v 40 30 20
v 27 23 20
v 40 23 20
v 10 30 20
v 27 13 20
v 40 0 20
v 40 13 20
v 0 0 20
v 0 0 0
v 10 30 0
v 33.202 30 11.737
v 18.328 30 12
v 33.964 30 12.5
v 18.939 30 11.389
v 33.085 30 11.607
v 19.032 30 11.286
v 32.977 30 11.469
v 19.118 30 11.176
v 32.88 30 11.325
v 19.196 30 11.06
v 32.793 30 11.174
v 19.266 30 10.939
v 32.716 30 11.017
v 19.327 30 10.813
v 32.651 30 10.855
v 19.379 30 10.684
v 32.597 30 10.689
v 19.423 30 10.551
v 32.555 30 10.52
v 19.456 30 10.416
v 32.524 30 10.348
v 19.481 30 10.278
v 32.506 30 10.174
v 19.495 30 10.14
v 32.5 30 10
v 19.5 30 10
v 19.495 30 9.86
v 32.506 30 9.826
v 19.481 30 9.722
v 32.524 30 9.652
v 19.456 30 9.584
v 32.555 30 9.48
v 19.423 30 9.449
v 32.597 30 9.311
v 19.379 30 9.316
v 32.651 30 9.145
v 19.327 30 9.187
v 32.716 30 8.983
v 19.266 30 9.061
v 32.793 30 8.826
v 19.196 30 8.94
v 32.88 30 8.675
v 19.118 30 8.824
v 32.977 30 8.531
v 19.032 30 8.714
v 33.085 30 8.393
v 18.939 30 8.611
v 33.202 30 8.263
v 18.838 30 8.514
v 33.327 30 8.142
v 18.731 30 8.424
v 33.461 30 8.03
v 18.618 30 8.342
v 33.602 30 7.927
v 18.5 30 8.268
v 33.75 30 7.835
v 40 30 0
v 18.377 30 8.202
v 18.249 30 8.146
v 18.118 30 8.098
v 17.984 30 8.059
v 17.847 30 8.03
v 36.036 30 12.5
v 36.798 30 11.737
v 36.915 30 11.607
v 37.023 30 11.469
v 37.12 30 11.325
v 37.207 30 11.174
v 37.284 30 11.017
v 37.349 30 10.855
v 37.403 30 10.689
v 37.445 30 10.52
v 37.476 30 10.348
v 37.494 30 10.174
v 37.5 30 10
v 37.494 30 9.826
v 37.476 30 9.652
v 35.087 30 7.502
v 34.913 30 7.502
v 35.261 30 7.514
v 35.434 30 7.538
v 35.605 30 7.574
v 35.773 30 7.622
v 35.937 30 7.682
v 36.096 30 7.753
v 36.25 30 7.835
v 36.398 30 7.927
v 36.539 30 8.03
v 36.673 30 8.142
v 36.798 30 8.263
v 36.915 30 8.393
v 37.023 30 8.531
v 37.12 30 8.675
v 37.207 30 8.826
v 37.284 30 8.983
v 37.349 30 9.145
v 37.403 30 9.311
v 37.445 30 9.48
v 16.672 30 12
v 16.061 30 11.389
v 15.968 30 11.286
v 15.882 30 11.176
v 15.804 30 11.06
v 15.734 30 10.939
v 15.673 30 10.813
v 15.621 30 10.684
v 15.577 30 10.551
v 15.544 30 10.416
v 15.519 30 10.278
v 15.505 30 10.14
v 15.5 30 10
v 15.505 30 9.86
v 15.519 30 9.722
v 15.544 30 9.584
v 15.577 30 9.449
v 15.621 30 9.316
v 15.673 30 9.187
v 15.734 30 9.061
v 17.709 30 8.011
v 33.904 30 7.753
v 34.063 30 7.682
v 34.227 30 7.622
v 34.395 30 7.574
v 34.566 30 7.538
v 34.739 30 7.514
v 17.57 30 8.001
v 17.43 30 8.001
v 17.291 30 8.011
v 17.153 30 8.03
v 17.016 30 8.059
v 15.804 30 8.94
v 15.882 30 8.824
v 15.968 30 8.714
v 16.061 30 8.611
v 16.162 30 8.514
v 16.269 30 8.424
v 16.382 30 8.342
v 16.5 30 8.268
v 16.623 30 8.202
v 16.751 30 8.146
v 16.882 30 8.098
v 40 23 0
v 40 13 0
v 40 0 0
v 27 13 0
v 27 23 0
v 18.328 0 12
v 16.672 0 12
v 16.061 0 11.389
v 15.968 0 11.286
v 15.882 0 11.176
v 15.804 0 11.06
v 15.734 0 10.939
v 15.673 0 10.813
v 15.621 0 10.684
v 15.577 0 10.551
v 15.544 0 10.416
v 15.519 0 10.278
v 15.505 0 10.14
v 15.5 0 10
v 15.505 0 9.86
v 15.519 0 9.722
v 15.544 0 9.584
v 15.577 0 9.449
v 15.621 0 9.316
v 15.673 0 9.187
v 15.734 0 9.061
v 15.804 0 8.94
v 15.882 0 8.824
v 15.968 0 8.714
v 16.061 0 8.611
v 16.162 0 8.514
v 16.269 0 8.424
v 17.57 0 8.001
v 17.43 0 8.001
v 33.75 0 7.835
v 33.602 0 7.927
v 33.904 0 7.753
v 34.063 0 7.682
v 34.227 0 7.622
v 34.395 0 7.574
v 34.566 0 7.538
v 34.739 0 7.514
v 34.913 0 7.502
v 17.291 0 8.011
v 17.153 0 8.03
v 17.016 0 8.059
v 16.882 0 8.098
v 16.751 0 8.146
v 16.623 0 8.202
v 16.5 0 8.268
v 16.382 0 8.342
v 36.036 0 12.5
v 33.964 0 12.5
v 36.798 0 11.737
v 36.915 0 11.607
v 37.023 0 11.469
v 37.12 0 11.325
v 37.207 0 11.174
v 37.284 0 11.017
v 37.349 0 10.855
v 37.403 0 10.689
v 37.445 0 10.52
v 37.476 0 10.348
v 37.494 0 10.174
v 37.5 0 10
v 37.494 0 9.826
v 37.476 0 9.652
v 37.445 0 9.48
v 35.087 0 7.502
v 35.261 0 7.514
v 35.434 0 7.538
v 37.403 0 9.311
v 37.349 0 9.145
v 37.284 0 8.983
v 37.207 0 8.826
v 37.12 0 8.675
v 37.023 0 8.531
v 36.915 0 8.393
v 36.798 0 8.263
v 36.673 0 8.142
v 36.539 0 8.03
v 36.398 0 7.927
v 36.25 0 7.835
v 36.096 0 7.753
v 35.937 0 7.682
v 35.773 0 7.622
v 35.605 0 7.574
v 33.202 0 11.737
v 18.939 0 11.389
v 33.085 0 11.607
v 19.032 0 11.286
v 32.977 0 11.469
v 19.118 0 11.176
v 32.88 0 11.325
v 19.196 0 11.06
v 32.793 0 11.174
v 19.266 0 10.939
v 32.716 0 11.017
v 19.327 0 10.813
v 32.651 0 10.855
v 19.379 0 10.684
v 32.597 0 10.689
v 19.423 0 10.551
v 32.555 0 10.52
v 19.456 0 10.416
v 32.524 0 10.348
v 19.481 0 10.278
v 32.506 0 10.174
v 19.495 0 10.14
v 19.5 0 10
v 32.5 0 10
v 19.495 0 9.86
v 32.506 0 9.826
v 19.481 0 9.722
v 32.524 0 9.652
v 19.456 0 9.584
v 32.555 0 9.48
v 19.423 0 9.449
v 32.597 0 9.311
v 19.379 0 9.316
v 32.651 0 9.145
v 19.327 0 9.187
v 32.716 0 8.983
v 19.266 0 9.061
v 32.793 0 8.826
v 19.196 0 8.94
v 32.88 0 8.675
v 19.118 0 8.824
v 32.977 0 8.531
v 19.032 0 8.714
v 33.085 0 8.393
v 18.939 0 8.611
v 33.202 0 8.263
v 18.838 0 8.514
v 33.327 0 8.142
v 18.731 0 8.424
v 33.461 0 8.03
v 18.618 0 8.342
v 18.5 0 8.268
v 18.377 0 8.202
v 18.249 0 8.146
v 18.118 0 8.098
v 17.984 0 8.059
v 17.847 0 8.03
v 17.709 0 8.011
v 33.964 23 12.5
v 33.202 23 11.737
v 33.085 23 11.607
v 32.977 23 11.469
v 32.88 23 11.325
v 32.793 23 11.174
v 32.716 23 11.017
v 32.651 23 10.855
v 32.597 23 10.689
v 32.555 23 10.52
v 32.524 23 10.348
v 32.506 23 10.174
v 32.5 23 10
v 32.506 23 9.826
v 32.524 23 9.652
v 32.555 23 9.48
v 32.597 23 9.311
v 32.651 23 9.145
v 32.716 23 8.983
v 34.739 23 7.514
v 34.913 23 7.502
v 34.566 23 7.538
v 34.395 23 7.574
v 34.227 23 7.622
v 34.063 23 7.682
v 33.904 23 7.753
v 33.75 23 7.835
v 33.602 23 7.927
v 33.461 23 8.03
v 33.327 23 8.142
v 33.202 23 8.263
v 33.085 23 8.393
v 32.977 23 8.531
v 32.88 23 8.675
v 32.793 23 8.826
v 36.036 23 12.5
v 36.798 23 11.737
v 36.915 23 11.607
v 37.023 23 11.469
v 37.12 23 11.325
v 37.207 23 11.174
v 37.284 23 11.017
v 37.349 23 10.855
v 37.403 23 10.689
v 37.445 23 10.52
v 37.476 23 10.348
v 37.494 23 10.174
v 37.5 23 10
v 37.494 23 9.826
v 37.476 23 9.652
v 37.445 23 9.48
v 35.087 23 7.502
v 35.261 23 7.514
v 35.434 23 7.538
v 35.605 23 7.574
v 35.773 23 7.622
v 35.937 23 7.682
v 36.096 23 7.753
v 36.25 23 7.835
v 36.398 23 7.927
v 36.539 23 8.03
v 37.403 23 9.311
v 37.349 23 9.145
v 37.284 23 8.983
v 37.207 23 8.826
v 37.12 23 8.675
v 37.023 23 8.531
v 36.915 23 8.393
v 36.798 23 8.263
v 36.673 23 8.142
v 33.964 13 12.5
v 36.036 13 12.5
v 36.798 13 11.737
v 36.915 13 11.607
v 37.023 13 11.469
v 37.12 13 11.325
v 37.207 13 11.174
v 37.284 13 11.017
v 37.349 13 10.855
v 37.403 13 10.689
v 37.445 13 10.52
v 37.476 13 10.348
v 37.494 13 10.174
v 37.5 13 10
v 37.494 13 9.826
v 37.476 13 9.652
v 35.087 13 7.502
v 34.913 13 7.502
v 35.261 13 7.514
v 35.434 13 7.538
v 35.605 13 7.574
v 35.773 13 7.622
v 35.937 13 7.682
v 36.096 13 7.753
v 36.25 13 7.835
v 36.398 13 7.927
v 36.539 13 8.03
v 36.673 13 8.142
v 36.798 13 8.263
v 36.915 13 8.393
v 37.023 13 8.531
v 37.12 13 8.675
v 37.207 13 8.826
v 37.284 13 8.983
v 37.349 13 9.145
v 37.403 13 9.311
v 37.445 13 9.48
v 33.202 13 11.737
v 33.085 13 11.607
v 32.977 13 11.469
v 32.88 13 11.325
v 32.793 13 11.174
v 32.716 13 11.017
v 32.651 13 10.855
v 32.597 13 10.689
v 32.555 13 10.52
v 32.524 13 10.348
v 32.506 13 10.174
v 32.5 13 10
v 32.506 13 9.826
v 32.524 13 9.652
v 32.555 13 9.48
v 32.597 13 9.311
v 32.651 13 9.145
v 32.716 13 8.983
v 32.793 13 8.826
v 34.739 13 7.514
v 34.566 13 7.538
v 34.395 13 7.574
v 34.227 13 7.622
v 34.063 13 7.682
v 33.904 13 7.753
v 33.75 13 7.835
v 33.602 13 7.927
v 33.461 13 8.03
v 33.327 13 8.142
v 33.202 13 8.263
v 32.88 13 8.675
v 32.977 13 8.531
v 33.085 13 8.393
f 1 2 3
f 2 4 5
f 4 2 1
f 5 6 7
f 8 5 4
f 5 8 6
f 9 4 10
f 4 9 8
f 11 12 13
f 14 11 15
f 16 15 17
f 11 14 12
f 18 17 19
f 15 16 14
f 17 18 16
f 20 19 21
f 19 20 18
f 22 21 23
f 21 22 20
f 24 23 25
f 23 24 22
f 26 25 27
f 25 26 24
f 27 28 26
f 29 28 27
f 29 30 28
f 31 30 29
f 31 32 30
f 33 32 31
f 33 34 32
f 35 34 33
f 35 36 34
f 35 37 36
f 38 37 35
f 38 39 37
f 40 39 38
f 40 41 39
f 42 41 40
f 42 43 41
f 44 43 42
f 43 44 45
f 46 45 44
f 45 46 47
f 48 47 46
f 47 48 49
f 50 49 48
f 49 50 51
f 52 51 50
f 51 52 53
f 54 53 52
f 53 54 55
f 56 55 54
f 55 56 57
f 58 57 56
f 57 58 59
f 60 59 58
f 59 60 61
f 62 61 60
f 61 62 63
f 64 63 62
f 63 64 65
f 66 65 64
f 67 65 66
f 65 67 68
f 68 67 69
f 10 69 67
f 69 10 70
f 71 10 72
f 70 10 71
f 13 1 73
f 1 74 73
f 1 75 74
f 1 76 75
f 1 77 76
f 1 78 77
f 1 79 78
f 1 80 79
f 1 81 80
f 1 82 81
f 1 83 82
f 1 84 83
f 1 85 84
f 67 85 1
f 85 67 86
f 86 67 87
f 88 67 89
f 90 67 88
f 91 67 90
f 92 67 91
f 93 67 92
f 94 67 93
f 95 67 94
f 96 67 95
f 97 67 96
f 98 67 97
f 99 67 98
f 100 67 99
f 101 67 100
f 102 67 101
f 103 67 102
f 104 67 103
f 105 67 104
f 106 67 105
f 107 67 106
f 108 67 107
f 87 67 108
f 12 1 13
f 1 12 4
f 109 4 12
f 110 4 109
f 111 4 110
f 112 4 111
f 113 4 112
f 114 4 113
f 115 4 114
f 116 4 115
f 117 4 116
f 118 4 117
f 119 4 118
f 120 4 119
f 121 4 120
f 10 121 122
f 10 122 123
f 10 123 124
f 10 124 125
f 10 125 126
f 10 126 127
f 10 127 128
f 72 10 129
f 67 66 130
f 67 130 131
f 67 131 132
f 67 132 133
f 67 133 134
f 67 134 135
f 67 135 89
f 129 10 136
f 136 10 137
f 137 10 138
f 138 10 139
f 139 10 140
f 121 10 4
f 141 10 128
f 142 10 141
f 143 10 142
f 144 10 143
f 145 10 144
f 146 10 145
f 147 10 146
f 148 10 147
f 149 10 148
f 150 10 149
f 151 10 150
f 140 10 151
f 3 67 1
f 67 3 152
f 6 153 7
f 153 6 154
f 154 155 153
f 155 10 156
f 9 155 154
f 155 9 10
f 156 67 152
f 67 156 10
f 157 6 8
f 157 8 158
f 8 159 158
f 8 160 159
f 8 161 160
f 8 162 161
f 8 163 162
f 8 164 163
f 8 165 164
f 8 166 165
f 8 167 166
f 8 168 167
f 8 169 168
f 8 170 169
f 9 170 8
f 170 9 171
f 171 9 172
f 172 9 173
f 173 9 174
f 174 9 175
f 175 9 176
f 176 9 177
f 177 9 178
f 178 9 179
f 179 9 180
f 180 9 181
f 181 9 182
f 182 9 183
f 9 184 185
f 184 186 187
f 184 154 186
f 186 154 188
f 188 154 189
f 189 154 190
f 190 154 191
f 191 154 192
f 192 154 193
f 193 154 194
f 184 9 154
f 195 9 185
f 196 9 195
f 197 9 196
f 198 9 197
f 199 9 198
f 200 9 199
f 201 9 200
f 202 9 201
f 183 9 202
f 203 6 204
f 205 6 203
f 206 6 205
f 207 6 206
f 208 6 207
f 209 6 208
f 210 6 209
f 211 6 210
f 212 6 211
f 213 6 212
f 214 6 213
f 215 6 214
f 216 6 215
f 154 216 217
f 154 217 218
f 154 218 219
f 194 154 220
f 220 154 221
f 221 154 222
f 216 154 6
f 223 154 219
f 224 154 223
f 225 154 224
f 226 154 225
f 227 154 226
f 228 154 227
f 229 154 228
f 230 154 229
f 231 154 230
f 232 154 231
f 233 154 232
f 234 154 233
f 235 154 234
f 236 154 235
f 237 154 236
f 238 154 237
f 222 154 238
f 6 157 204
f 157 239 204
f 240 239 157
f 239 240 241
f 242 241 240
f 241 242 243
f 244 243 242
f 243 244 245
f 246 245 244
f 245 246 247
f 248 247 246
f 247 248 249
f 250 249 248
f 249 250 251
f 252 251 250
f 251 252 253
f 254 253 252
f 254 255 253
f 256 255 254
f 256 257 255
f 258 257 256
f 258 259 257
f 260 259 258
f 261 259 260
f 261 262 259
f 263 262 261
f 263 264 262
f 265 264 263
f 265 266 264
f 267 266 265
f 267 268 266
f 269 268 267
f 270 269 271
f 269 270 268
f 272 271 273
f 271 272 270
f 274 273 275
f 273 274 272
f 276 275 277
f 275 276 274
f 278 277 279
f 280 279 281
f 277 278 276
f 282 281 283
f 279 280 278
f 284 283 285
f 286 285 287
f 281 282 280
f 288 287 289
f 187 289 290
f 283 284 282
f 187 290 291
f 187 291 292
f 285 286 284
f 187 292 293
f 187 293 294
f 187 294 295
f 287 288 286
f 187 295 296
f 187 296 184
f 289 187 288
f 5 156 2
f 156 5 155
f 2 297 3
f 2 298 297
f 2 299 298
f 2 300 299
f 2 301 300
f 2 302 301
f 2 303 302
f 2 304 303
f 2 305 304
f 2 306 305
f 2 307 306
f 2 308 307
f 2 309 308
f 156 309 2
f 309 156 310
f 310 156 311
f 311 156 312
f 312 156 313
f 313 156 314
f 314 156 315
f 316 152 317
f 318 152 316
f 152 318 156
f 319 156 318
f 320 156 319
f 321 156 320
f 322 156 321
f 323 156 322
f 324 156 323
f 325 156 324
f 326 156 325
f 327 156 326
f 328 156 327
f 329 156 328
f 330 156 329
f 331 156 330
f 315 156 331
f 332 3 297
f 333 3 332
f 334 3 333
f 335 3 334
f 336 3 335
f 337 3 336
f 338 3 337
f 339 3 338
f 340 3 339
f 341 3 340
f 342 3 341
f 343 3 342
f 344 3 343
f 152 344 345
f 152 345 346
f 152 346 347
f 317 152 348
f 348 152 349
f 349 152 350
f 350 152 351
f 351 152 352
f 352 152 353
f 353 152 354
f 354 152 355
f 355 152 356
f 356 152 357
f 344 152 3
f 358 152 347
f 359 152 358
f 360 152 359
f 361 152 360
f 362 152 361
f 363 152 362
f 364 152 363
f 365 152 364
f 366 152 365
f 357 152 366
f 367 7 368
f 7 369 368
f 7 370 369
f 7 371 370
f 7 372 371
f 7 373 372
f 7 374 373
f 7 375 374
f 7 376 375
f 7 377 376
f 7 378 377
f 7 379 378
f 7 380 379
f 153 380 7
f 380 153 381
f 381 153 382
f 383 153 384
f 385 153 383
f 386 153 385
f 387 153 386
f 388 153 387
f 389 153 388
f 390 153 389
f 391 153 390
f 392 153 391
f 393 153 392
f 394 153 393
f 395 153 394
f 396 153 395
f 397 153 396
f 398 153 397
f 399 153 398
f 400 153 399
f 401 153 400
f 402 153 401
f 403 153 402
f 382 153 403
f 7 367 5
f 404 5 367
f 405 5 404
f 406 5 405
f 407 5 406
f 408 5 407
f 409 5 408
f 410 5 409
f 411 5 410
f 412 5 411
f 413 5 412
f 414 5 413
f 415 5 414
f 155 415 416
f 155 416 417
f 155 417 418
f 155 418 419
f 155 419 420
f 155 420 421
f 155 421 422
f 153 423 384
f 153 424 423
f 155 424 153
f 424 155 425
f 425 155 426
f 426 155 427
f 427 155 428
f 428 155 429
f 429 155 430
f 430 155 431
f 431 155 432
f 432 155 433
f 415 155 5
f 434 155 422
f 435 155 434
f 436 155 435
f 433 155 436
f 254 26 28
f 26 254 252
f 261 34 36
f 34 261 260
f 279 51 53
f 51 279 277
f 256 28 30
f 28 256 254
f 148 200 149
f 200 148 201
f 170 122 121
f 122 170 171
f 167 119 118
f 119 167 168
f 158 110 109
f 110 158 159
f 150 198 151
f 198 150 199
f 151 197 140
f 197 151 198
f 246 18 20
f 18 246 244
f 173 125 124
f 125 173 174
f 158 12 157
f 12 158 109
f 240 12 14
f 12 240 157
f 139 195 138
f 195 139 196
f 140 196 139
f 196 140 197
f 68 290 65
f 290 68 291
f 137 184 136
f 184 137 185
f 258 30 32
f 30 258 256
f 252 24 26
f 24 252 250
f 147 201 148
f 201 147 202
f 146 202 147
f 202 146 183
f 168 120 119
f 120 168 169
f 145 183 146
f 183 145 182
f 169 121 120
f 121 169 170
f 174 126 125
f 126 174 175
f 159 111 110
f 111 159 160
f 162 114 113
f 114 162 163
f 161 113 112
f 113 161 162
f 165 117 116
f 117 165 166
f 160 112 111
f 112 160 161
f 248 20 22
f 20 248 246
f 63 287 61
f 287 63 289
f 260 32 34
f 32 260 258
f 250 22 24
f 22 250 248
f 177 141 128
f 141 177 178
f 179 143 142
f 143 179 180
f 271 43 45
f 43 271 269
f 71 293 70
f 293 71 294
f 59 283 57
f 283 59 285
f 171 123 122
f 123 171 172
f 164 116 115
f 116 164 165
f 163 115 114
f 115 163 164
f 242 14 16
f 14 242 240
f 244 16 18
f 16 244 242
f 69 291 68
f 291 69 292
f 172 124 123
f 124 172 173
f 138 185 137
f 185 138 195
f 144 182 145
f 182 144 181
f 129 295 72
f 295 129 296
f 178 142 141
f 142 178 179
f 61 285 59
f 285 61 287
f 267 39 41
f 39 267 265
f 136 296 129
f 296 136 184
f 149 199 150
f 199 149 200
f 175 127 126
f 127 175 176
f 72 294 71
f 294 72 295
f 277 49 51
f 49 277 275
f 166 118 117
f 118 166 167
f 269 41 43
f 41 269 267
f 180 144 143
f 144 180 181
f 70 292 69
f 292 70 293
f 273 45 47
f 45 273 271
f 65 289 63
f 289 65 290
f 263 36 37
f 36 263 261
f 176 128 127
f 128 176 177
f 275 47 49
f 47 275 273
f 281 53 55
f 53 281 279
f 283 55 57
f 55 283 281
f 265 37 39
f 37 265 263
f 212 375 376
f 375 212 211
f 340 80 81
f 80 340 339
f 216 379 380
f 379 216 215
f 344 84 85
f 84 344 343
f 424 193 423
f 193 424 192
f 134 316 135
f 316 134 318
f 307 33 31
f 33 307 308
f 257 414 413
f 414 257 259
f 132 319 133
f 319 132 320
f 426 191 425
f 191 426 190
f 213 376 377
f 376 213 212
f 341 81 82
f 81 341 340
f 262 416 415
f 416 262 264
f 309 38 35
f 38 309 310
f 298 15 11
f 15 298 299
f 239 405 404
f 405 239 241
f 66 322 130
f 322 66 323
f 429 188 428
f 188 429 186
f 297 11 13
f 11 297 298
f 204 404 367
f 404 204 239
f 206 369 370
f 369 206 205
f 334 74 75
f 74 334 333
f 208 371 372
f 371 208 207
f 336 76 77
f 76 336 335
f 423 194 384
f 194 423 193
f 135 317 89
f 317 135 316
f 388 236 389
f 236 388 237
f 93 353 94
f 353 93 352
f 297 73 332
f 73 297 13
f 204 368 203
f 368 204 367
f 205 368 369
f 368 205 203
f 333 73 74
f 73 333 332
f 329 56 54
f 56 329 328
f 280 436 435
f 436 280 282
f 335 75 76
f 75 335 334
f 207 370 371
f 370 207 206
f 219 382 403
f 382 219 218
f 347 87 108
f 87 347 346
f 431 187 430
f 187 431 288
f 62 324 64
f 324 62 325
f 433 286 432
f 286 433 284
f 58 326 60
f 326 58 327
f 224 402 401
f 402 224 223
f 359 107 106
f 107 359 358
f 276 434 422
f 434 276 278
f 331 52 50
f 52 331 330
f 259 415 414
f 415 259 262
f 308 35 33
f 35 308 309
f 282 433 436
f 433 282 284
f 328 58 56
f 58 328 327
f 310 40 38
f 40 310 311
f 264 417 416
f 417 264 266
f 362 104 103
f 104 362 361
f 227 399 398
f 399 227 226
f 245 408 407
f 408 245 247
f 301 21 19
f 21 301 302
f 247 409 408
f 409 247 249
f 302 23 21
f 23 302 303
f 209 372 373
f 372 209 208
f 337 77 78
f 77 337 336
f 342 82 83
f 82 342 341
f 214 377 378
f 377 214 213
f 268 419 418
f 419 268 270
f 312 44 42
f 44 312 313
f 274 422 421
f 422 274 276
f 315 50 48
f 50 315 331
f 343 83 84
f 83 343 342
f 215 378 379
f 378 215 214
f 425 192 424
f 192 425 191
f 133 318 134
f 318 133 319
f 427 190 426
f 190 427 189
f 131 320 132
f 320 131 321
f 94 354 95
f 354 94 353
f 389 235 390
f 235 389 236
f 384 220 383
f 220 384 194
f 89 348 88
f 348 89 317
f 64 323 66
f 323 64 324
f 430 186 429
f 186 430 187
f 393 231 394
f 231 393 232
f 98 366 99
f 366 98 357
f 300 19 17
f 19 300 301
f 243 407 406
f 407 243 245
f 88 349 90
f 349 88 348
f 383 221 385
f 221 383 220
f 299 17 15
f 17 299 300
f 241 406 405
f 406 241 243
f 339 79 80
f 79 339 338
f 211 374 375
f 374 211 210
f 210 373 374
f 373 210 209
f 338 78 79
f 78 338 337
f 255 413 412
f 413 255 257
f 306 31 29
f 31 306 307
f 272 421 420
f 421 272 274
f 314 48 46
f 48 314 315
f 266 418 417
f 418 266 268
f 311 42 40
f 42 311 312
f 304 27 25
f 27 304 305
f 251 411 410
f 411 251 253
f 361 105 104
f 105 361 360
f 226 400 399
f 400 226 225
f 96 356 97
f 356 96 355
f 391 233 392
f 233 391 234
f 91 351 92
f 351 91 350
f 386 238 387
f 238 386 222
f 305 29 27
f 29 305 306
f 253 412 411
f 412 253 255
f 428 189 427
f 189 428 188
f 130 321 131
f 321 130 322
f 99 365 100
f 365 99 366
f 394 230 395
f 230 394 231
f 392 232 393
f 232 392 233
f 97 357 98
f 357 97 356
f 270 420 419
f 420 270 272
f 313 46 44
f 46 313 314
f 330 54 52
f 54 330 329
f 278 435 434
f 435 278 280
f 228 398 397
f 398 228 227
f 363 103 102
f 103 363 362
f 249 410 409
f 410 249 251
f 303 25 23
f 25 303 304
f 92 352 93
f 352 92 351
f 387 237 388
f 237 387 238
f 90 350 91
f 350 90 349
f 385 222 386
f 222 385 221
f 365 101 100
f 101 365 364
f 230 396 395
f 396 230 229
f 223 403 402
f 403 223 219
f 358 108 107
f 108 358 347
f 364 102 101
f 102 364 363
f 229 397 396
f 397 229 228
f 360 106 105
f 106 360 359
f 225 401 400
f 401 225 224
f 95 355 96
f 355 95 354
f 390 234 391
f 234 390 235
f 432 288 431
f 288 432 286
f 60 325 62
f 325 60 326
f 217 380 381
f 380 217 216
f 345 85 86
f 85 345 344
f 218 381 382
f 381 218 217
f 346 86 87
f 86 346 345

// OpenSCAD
// file: trunctear.scad
//A module for truncated tear drops.

trunctear(1, 0.5, $fn = 90);

module trunctear(height, radian)
{
    hull()
    {
        cylinder(h = height, r = radian);
        translate([0, radian/2, height/2])
            cube([2*(radian*(2*cos(45)-1)), radian, height], center = true);
    }
}
// main file
// To mount on the middle extrusion and tension the z belt
// Uses one 35mm m4 and one 35mm m5 as well as one m5 t nut

use<trunctear.scad>

ZTensioner();

module ZTensioner()
{
    difference()
    {
        union()
        {
            hull()
            {
                translate([40/2, -1, 20/2])
                    cube([40, 2, 20], center = true);
                translate([30/2+10, 30/2, 20/2])
                    cube([30, 30, 20], center = true);
            }
        }
        translate([40/2, -1, 20/2])
            cube([40, 2, 20], center = true);
        translate([40-13/2, 10+24-21+5, 20/2])
            cube([13, 10, 20], center = true);
        translate([15/2+10, 0, 10])
            rotate([90, 0, 180])
                trunctear(30, 2, $fn = 90);
        translate([40-5, 0, 10])
            rotate([90, 0, 180])
                trunctear(30, 2.5, $fn = 90);
    }
}
